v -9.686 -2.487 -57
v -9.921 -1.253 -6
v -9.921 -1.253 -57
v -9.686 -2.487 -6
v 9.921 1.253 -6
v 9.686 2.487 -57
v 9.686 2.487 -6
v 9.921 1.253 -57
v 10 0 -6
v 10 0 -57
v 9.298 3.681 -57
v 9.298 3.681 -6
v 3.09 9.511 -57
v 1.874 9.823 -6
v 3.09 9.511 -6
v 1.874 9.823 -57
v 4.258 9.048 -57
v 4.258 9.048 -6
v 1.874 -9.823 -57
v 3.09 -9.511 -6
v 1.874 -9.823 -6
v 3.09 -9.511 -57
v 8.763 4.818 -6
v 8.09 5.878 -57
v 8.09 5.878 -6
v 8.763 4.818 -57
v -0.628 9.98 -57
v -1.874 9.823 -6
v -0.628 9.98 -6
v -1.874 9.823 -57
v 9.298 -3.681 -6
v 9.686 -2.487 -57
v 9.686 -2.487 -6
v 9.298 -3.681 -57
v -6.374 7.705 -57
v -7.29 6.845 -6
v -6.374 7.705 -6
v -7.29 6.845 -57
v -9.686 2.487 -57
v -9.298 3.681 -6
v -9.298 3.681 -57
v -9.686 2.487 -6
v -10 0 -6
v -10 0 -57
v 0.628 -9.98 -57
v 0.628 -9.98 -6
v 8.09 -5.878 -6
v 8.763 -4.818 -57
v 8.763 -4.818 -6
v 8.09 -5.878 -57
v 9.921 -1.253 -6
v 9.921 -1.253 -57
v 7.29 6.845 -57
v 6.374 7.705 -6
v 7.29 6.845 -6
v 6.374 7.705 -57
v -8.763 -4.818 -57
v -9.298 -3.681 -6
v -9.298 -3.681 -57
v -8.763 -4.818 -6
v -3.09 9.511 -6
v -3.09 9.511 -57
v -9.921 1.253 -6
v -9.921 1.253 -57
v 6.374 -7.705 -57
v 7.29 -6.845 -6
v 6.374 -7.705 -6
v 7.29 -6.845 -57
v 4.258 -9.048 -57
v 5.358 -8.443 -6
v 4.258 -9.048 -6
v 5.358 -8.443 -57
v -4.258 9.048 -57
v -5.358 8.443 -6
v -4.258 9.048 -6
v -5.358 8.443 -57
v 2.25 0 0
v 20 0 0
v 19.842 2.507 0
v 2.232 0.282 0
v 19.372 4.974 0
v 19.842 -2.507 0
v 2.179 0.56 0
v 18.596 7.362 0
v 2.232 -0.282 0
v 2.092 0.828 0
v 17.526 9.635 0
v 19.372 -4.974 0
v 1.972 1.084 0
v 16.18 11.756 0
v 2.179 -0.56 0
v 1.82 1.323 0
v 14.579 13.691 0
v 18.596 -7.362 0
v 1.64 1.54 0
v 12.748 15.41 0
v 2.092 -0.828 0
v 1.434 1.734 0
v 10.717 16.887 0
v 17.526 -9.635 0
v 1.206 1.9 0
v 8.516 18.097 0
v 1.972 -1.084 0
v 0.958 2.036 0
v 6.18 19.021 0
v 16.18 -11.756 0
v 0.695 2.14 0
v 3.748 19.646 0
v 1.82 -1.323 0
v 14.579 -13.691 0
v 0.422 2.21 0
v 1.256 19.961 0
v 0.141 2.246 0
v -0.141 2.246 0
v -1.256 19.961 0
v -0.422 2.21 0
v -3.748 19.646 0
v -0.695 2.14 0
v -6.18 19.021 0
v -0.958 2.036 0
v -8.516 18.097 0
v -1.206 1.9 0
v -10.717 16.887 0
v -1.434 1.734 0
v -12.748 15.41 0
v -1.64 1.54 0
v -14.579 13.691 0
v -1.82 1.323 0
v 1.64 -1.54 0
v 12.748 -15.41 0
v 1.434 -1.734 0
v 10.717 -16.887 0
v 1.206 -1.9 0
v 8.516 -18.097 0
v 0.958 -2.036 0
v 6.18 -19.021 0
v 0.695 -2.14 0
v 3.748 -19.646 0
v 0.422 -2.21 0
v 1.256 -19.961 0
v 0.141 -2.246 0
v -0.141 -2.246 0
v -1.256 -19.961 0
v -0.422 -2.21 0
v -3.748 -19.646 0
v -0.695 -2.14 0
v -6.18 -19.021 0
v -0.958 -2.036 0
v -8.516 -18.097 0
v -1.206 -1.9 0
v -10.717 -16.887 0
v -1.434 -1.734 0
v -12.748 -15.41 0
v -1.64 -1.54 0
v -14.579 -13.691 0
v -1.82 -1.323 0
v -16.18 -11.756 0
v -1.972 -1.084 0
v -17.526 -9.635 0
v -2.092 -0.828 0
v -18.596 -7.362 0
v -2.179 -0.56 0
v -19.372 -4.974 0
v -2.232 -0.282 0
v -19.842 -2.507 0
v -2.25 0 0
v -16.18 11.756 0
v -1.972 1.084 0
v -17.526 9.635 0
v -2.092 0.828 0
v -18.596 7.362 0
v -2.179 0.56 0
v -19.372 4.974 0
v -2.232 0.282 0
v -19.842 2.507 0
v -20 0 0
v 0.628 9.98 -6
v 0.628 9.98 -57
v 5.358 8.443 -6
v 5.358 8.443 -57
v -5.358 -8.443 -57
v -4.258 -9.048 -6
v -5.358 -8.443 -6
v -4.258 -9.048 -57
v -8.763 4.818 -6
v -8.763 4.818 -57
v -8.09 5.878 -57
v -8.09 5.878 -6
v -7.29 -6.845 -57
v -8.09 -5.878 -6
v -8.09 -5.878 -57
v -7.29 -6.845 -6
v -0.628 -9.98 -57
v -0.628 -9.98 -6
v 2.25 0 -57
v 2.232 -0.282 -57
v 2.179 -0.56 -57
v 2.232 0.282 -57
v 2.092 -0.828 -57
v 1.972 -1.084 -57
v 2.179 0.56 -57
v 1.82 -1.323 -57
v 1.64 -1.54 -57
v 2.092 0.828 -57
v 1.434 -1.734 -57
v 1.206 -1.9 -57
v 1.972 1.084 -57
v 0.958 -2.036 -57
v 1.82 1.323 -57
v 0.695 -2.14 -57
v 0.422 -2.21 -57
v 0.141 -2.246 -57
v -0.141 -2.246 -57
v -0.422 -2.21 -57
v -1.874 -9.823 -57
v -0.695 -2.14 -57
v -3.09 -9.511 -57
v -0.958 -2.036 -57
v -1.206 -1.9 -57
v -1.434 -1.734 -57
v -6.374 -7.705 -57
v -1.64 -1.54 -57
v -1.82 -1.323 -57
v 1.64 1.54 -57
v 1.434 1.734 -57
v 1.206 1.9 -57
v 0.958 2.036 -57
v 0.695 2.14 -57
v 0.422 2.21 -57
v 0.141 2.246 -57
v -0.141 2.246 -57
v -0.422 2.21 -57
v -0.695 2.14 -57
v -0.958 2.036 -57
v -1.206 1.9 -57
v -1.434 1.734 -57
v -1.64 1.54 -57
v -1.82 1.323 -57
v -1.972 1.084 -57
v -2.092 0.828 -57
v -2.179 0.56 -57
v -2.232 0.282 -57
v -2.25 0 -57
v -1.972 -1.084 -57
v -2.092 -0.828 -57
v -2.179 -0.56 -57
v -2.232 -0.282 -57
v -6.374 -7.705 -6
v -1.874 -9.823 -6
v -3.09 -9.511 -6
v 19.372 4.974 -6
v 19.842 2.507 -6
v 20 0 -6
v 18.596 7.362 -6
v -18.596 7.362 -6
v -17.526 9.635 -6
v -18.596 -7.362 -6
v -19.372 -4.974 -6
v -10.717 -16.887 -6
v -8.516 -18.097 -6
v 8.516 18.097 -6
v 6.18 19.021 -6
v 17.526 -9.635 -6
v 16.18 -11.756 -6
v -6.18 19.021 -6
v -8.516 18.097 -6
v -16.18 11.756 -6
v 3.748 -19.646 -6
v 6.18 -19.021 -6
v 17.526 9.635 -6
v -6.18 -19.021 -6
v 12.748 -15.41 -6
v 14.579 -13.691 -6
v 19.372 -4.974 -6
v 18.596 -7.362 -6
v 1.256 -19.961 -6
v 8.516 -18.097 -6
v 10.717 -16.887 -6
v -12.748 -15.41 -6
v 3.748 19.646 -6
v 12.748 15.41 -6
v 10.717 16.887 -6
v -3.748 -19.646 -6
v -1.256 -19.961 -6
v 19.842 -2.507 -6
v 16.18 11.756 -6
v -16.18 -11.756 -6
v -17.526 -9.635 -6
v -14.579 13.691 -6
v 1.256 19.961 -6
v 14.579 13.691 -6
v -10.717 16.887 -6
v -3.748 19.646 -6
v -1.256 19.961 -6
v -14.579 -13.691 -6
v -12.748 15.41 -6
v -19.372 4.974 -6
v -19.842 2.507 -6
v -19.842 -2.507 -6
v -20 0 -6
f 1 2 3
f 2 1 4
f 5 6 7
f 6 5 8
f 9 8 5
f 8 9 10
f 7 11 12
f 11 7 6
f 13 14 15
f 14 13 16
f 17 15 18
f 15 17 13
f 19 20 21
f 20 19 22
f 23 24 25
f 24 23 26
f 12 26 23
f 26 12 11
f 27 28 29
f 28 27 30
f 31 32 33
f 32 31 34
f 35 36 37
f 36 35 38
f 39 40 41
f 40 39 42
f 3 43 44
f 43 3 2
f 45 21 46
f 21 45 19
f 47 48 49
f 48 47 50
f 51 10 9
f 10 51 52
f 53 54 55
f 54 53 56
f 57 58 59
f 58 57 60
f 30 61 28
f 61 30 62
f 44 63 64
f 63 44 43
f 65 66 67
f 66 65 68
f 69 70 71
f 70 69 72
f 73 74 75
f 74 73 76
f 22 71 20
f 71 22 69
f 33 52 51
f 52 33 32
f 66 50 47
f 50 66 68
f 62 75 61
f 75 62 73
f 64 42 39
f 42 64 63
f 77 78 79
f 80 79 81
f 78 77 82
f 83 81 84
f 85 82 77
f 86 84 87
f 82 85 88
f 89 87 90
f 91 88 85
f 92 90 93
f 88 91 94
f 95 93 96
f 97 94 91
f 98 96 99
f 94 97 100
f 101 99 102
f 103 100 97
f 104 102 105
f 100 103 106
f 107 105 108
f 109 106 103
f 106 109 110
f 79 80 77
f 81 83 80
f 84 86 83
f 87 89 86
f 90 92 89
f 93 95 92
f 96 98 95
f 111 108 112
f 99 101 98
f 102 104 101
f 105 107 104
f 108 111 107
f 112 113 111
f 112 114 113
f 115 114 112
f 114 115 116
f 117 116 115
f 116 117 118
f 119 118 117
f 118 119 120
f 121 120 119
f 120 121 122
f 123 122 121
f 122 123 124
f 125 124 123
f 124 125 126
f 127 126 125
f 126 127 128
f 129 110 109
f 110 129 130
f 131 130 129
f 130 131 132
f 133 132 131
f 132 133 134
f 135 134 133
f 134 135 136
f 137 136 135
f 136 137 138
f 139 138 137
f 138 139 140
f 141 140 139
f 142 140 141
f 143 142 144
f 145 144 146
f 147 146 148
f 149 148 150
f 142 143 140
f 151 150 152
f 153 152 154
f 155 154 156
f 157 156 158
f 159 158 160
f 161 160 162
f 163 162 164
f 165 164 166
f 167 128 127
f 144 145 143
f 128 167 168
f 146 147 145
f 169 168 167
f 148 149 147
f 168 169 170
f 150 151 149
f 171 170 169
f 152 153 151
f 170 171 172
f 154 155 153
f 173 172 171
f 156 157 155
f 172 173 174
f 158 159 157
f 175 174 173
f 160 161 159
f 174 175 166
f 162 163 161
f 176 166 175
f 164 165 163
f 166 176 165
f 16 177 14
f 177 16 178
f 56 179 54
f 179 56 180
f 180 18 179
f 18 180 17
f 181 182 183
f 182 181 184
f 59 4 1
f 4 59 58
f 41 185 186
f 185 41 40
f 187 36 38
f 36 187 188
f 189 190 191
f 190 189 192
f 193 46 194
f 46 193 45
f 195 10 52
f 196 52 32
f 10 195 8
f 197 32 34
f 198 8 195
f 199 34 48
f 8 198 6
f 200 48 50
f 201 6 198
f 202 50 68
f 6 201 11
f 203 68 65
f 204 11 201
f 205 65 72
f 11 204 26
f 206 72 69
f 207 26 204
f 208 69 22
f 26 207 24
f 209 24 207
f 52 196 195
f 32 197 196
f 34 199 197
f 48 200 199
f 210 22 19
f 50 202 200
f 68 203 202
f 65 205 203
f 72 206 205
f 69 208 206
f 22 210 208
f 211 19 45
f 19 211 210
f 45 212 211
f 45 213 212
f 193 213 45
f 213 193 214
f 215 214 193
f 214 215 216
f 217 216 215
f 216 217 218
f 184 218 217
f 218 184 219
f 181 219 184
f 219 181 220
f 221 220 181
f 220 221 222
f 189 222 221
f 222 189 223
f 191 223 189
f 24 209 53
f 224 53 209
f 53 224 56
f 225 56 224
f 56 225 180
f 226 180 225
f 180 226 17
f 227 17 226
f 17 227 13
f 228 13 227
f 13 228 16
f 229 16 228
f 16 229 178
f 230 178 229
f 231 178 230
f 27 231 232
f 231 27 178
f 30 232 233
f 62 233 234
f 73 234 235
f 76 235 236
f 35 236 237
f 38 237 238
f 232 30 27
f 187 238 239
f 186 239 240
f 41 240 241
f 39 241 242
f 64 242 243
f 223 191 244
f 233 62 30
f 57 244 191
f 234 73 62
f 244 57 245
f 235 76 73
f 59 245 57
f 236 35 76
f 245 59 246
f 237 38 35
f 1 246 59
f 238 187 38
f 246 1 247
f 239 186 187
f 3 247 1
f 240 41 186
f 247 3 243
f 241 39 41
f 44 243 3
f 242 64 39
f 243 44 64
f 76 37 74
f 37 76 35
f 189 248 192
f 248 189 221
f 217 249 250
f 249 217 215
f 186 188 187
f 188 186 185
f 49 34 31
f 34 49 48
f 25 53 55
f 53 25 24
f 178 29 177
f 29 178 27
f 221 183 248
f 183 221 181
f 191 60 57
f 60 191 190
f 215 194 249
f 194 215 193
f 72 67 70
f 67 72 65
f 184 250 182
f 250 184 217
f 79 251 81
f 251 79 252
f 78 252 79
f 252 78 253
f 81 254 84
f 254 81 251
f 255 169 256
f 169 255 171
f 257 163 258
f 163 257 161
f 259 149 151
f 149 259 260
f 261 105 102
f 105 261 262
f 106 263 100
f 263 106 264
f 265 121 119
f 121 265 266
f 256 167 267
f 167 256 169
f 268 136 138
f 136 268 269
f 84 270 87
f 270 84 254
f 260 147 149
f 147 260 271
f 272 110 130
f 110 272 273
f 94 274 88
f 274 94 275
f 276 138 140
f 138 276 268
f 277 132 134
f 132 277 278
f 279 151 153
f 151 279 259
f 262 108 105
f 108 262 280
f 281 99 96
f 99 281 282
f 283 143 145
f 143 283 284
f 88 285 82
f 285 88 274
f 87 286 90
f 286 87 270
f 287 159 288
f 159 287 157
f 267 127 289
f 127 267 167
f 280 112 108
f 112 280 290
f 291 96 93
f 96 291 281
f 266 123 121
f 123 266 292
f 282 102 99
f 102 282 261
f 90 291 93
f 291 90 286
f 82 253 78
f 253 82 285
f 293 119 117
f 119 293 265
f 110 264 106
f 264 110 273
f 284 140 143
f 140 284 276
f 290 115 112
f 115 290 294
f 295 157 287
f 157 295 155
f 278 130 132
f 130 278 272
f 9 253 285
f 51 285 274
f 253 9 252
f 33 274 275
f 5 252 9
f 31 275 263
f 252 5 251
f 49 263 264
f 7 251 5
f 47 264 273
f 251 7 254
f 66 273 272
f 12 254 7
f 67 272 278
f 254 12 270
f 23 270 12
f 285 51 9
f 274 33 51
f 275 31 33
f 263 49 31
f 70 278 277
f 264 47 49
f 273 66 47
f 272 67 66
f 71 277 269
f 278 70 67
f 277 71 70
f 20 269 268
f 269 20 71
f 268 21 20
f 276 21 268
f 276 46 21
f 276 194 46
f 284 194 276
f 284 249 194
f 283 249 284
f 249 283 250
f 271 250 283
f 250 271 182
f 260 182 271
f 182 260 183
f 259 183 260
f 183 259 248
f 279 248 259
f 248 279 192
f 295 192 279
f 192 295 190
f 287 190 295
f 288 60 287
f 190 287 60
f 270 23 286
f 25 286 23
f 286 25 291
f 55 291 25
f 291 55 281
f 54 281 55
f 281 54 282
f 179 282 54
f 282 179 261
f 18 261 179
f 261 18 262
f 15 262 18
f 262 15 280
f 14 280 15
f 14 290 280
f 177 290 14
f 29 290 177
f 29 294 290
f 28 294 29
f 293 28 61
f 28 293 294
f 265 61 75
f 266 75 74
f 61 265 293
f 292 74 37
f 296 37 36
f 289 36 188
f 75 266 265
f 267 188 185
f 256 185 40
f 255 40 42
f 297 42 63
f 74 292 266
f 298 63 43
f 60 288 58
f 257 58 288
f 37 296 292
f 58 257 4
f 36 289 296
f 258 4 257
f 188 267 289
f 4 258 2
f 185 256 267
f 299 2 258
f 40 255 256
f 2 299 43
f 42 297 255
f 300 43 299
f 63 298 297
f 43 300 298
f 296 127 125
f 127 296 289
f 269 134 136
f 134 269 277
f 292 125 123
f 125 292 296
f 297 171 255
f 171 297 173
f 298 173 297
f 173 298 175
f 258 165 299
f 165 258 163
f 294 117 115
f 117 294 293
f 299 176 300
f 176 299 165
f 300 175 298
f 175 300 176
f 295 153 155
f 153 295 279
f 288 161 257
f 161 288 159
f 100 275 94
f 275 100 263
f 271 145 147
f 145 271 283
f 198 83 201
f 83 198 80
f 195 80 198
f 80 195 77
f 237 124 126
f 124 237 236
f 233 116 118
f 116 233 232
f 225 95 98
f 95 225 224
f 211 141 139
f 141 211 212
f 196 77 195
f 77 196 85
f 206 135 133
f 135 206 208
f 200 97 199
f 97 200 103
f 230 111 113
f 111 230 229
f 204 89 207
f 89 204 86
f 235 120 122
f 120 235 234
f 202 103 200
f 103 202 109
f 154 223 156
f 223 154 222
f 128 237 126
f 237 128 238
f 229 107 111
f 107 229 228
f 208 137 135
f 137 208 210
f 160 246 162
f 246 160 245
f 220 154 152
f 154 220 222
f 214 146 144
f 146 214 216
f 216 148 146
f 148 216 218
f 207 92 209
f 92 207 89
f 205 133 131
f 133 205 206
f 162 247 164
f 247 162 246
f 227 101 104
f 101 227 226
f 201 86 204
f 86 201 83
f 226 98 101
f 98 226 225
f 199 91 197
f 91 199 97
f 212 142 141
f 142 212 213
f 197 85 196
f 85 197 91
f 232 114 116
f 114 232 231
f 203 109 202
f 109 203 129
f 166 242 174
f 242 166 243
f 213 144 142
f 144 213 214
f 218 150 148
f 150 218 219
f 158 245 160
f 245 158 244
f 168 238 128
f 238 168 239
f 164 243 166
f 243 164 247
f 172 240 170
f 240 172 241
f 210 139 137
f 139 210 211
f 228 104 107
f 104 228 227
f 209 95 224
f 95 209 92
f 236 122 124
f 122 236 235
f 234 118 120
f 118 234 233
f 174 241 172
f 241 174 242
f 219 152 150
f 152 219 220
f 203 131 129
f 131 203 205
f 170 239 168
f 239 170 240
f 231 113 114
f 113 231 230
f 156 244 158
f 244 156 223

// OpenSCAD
$fn = 50;


difference() {
	union() {
		translate(v = [0, 0, -57.0000000000]) {
			cylinder(h = 57, r = 10.0000000000);
		}
		translate(v = [0, 0, -6.0000000000]) {
			cylinder(h = 6, r = 20.0000000000);
		}
	}
	union() {
		#translate(v = [0, 0, -57]) {
			cylinder(h = 57, r = 2.2500000000);
		}
	}
}
